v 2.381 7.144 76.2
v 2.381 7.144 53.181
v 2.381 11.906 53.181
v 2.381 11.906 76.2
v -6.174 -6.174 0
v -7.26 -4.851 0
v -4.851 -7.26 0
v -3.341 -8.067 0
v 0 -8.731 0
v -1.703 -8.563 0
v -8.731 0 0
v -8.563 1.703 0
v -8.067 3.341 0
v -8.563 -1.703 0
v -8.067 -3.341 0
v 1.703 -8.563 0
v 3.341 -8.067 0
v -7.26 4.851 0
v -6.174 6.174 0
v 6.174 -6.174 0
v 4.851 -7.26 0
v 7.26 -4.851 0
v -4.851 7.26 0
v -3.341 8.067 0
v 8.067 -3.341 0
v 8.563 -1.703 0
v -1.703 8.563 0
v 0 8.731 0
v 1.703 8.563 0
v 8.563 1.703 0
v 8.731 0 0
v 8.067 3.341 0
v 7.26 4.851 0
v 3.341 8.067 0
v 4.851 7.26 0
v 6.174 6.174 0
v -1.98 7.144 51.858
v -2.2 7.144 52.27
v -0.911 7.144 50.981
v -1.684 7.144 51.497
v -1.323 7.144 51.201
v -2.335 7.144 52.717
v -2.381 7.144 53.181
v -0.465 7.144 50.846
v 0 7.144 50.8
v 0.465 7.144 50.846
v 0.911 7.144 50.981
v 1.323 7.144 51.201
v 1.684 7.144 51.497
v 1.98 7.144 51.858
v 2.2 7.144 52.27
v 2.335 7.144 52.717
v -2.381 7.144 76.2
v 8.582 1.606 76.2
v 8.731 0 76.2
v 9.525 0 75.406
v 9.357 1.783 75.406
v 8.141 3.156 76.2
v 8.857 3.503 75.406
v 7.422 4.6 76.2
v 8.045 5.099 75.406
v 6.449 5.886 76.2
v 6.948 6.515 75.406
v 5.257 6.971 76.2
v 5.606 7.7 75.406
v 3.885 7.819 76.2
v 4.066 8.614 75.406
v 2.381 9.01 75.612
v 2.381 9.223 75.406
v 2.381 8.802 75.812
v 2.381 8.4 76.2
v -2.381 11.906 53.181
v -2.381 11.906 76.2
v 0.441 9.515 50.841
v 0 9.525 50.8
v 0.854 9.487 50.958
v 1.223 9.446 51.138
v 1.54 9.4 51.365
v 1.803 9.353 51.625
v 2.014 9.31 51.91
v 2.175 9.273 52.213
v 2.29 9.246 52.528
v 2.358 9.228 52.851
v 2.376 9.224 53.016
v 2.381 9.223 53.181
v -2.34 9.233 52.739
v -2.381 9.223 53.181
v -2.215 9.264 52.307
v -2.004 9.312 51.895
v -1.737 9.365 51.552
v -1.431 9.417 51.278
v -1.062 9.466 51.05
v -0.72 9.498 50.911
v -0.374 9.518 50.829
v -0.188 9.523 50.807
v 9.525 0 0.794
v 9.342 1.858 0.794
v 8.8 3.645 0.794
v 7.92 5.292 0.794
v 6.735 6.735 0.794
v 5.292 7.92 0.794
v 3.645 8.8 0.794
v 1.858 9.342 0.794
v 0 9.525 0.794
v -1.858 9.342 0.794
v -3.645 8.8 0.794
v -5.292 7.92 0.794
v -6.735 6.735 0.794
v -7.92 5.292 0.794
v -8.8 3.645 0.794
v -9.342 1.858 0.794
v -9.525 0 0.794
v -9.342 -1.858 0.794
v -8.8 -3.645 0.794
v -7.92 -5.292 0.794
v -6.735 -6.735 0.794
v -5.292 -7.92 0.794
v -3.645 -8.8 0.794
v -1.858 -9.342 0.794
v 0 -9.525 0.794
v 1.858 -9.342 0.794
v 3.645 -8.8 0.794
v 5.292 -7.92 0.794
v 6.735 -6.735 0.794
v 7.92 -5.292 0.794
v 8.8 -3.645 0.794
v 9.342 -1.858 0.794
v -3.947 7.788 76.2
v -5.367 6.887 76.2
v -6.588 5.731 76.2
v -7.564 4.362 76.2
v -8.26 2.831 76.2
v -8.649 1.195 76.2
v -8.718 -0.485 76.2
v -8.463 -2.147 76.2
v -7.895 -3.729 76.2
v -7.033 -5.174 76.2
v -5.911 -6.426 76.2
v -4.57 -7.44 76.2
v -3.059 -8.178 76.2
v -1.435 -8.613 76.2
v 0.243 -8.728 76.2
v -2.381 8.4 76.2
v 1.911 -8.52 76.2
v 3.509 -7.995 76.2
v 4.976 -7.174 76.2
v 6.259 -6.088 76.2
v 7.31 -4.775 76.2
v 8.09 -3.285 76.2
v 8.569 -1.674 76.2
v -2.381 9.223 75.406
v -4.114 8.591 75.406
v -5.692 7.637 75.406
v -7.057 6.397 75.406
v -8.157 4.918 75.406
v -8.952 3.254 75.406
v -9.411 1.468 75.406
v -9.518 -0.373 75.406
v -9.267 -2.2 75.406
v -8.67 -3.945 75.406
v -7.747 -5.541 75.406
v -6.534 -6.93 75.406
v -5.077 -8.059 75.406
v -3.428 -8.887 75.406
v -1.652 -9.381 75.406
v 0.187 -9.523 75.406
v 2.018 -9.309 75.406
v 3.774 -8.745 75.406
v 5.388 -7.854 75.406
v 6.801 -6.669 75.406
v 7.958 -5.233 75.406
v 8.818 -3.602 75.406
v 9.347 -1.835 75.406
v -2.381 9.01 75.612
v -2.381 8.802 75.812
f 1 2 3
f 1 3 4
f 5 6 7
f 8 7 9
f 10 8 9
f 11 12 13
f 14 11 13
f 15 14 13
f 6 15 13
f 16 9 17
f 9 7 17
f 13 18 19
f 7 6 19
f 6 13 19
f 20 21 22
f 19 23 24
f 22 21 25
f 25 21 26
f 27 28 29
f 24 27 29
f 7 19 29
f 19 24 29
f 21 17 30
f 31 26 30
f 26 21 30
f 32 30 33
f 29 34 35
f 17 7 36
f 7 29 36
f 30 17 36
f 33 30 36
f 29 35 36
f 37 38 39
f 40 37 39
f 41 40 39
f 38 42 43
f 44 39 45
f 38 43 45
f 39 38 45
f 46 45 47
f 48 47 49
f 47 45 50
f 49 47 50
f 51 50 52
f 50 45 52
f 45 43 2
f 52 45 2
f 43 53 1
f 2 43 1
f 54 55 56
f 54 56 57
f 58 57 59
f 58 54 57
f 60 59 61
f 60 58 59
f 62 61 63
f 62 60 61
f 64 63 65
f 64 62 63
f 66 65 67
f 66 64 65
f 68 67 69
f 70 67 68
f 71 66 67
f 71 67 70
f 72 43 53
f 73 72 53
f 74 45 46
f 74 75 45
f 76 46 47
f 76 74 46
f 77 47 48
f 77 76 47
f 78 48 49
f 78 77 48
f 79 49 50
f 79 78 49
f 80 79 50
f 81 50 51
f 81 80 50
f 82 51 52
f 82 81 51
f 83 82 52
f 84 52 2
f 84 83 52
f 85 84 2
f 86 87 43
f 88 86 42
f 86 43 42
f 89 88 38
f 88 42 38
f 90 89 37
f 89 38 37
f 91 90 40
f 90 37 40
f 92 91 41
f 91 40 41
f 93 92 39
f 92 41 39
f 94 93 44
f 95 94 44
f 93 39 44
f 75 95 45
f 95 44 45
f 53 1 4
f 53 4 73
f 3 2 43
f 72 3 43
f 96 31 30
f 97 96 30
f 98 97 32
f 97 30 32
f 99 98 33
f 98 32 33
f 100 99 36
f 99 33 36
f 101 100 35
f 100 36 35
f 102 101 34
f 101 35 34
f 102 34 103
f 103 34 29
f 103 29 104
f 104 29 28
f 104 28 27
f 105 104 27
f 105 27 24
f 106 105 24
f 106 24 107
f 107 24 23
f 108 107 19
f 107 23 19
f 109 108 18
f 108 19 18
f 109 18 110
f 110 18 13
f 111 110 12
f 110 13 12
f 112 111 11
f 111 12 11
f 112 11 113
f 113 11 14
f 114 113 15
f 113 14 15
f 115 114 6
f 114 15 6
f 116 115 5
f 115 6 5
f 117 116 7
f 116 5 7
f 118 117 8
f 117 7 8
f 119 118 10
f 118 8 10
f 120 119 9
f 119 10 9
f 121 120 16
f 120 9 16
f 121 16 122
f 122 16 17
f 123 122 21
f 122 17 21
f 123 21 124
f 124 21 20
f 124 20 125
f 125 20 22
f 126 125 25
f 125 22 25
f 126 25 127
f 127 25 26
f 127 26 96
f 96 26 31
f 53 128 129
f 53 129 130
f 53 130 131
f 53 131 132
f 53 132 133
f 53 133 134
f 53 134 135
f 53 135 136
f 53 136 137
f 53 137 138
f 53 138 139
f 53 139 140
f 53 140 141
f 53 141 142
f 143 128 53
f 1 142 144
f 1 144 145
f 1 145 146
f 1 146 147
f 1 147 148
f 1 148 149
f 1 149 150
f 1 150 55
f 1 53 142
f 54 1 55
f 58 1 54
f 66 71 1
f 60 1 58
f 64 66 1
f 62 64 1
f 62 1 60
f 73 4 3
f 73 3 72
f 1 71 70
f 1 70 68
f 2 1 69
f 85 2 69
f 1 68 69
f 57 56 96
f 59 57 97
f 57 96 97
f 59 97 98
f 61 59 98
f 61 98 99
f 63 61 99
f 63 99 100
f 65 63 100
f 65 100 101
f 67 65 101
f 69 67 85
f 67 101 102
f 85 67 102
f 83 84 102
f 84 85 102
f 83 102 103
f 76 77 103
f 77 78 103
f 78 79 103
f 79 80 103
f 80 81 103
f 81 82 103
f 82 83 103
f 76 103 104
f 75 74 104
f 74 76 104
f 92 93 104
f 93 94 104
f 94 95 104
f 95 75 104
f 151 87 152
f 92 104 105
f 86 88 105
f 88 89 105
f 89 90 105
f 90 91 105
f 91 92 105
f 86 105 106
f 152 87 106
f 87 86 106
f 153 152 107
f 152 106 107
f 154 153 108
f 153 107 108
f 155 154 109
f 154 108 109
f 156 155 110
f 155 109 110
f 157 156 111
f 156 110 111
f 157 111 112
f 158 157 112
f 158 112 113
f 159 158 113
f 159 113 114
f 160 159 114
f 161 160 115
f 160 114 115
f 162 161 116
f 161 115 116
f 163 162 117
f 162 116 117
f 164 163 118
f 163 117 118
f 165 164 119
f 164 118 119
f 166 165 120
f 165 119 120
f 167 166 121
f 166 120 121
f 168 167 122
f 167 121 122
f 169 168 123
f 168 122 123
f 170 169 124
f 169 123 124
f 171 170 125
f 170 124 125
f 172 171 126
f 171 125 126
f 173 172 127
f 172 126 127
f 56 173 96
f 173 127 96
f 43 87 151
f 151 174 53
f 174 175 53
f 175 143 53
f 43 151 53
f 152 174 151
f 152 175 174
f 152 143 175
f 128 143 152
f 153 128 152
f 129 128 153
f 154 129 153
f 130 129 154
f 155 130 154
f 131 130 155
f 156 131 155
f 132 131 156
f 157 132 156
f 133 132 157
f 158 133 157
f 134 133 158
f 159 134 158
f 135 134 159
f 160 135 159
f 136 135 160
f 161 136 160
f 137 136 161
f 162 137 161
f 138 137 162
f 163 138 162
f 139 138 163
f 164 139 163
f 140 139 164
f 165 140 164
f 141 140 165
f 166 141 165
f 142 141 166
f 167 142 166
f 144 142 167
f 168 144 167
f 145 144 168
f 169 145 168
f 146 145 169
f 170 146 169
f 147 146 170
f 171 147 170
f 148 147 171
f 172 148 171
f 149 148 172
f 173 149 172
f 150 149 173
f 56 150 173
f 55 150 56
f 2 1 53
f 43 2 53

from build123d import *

# Parameters (mm, degrees)
F0_R     = 9.525
F1_DEPTH = 76.2
F3_DEPTH = 25.4
F4_R     = 2.38115
F5_W     = 4.7625
F5_H     = 23.01875
F6_DEPTH = 4.7625
F7_SIZE  = 0.79375


# Not quite as in the source:
# - a fillet or chamfer is up to 0.001 mm smaller than in the source, because OpenCascade refuses the exact size


with BuildPart() as f1:
    # F0 (on Top) → F1 (new body)
    with BuildSketch(Plane.XY):
        Circle(F0_R)
    extrude(amount=F1_DEPTH)

    # F2 (on face) → F3 (cut)
    with BuildSketch(Plane.XY.offset(76.2)):
        with BuildLine():
            ThreePointArc((2.38125, 9.2225415932), (0, 9.525), (-2.38125, 9.2225415932))
            Line((-2.38125, 9.2225415932), (-2.38125, 7.14375))
            Line((-2.38125, 7.14375), (2.38125, 7.14375))
            Line((2.38125, 7.14375), (2.38125, 9.2225415932))
        make_face()
    extrude(amount=-F3_DEPTH, mode=Mode.SUBTRACT)

    # F4 (radius 2.38125 in the source; OpenCascade refuses exactly that, so slightly less here)
    f4_edges = [f1.edges().sort_by_distance(p)[0] for p in [
        (2.38125, 8.183146, 50.8),
        (-2.38125, 8.183146, 50.8),
    ]]
    fillet(f4_edges, radius=F4_R)

    # F7
    f7_edges = [f1.edges().sort_by_distance(p)[0] for p in [
        (-5.832847, -7.530174, 76.2),
        (-9.525, 0, 0),
    ]]
    chamfer(f7_edges, length=F7_SIZE)


with BuildPart() as f6:
    # F5 (on face) → F6 (new body)
    with BuildSketch(Plane(origin=(0, 7.14375, 0), x_dir=(-1, 0, 0), z_dir=(0, 1, 0))):
        with Locations((0, 64.690625)):
            Rectangle(F5_W, F5_H)
    extrude(amount=F6_DEPTH)


solid = Compound([f1.part, f6.part])
